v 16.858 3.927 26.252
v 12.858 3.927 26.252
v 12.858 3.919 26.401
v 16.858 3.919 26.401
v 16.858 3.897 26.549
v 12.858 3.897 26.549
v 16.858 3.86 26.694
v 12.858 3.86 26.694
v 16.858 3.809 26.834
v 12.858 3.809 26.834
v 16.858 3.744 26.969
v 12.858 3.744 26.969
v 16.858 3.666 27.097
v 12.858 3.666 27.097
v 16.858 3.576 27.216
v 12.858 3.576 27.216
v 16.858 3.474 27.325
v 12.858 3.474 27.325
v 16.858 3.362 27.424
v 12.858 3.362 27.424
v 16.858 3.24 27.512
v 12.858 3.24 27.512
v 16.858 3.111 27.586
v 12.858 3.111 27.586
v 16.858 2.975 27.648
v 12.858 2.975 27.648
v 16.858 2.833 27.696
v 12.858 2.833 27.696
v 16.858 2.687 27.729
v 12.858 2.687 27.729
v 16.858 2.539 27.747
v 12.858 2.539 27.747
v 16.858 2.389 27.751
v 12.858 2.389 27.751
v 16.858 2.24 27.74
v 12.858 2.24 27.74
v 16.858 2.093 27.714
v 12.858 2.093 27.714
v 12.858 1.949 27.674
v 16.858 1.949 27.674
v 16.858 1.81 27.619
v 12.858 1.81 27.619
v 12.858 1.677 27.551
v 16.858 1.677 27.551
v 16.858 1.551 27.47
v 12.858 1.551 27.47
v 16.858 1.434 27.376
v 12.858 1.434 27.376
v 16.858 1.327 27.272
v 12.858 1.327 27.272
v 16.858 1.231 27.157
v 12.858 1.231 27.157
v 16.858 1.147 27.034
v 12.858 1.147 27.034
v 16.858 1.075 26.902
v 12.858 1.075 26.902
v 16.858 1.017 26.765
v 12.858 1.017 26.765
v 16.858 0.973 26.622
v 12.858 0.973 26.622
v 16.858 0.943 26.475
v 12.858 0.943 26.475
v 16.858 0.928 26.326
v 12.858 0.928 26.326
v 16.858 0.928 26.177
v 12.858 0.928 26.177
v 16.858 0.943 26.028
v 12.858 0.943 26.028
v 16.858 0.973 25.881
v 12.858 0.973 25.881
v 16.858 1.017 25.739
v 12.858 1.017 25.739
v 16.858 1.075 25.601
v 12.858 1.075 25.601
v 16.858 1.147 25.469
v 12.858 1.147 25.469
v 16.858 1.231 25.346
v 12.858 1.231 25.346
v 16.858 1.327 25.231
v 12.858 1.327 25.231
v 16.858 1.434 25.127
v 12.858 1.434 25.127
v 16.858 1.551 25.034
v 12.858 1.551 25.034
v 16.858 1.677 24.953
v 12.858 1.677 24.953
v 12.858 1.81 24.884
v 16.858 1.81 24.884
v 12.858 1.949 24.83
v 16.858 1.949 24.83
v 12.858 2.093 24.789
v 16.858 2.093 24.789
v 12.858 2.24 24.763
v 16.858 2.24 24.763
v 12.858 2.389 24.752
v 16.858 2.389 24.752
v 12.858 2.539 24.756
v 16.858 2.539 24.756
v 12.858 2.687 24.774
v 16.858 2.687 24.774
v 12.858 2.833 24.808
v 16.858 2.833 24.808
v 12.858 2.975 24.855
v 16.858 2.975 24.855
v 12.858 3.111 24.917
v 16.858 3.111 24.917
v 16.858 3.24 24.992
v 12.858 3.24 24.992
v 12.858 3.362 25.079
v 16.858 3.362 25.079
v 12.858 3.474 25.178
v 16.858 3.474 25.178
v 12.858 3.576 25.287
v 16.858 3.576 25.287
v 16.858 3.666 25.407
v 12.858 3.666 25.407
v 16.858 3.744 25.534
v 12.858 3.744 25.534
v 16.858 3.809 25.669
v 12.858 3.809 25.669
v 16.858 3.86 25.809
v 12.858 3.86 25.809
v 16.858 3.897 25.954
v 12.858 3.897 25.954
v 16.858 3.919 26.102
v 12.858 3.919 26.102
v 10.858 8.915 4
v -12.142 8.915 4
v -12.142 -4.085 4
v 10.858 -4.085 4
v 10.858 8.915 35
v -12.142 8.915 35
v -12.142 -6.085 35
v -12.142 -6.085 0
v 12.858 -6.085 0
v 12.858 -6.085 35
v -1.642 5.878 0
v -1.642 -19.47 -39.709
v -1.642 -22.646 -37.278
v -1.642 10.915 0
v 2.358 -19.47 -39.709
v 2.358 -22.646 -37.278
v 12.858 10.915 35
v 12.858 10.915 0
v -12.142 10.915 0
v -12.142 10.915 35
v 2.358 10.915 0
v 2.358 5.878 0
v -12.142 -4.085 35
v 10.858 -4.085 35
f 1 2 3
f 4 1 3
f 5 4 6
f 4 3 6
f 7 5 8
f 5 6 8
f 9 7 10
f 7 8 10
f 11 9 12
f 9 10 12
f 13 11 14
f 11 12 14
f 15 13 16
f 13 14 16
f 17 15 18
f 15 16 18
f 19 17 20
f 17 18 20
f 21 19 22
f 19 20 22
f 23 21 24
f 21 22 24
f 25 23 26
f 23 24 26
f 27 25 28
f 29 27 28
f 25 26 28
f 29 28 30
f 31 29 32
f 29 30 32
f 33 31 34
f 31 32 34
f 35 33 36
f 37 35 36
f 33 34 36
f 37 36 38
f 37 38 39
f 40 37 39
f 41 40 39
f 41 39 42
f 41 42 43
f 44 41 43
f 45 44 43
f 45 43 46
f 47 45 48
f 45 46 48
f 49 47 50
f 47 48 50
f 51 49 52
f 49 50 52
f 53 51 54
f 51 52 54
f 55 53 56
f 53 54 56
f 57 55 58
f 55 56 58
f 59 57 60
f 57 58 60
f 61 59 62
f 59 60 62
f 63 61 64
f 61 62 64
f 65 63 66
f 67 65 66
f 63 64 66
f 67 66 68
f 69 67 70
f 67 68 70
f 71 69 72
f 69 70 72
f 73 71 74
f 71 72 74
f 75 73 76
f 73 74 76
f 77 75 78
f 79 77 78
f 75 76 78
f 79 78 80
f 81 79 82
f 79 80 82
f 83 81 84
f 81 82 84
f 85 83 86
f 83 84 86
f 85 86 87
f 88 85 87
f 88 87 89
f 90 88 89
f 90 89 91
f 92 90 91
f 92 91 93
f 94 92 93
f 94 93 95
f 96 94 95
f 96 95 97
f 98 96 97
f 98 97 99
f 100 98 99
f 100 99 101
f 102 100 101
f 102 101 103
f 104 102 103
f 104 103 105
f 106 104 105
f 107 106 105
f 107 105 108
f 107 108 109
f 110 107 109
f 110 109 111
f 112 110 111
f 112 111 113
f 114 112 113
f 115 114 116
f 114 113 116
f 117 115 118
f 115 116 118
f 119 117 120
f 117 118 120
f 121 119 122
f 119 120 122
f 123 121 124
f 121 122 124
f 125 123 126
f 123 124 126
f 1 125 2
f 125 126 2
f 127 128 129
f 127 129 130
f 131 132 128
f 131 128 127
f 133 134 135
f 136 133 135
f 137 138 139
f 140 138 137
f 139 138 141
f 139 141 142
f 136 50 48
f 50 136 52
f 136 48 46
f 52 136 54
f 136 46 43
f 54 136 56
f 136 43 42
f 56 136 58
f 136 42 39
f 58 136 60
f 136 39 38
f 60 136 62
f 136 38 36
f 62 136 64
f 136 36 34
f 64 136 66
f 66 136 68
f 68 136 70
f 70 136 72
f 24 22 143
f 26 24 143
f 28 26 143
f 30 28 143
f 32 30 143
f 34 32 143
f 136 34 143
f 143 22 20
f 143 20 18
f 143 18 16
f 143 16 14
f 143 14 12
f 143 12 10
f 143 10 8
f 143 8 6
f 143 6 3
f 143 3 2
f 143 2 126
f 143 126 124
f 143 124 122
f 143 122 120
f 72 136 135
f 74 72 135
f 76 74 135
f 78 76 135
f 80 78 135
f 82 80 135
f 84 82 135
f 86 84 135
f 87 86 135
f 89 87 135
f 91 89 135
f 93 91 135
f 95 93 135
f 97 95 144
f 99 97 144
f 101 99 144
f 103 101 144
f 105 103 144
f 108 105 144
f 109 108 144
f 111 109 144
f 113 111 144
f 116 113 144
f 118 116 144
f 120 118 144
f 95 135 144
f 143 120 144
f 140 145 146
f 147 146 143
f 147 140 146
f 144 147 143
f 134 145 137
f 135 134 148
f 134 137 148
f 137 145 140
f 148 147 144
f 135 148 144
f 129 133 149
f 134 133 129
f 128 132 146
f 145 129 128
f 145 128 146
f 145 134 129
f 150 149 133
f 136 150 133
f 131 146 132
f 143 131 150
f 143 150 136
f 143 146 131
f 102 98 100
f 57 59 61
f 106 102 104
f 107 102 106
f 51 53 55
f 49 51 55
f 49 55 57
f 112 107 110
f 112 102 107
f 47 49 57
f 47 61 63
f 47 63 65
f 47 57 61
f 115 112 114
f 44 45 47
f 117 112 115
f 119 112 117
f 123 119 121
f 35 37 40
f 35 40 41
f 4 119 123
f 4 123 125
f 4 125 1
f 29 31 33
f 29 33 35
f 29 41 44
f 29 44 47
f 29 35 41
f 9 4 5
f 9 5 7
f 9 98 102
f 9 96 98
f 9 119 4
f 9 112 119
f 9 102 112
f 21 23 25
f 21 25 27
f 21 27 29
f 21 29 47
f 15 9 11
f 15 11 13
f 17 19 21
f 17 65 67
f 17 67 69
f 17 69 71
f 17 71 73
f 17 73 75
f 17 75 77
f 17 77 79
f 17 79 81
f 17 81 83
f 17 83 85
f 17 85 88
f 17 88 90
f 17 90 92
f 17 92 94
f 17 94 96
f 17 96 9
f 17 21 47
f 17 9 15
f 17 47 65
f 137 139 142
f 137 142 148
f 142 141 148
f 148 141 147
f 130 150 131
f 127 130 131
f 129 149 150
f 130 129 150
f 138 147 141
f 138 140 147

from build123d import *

# Parameters (mm, degrees)
SKETCH2_W           = 25
SKETCH2_H           = 17
BOSS_EXTRUDE1_DEPTH = 35
BOSS_EXTRUDE2_START = -12.5
BOSS_EXTRUDE2_DEPTH = 2
SKETCH4_W           = 26
SKETCH4_H           = 10
CUT_EXTRUDE1_DEPTH  = 10
SKETCH5_W           = 23
SKETCH5_H           = 13
CUT_EXTRUDE2_DEPTH  = 31
SKETCH6_R           = 1.5
BOSS_EXTRUDE4_DEPTH = 4


with BuildPart() as part:
    # Sketch2 → Boss-Extrude1 (new body)
    with BuildSketch(Plane.XY):
        with Locations((0.358490566, 2.41509434)):
            Rectangle(SKETCH2_W, SKETCH2_H)
    extrude(amount=BOSS_EXTRUDE1_DEPTH)

    # Sketch3 → Boss-Extrude2 (add, symmetric)
    with BuildSketch(Plane.ZY.offset(12.141509434).offset(BOSS_EXTRUDE2_START)):
        Polygon((0, 10.91509434), (-39.708579083, -19.469585142), (-37.277804725, -22.646271469), (0, 5.878399383), align=None)
    extrude(amount=BOSS_EXTRUDE2_DEPTH, both=True)

    # Sketch4 → Cut-Extrude1 (cut)
    with BuildSketch(Plane.ZY.offset(12.141509434)):
        with Locations((22, 2.41509434)):
            Rectangle(SKETCH4_W, SKETCH4_H)
    extrude(amount=-CUT_EXTRUDE1_DEPTH, mode=Mode.SUBTRACT)

    # Sketch5 → Cut-Extrude2 (cut)
    with BuildSketch(Plane.XY.offset(35)):
        with Locations((-0.641509434, 2.41509434)):
            Rectangle(SKETCH5_W, SKETCH5_H)
    extrude(amount=-CUT_EXTRUDE2_DEPTH, mode=Mode.SUBTRACT)

    # Sketch6 → Boss-Extrude4 (add)
    with BuildSketch(Plane(origin=(12.858490566, 0, 0), x_dir=(0, 0, -1), z_dir=(1, 0, 0))):
        with Locations(Location((-26.251622056, 2.426562122, 0), (0, 0, 90))):
            Circle(SKETCH6_R)
    extrude(amount=BOSS_EXTRUDE4_DEPTH)


solid = part.part
